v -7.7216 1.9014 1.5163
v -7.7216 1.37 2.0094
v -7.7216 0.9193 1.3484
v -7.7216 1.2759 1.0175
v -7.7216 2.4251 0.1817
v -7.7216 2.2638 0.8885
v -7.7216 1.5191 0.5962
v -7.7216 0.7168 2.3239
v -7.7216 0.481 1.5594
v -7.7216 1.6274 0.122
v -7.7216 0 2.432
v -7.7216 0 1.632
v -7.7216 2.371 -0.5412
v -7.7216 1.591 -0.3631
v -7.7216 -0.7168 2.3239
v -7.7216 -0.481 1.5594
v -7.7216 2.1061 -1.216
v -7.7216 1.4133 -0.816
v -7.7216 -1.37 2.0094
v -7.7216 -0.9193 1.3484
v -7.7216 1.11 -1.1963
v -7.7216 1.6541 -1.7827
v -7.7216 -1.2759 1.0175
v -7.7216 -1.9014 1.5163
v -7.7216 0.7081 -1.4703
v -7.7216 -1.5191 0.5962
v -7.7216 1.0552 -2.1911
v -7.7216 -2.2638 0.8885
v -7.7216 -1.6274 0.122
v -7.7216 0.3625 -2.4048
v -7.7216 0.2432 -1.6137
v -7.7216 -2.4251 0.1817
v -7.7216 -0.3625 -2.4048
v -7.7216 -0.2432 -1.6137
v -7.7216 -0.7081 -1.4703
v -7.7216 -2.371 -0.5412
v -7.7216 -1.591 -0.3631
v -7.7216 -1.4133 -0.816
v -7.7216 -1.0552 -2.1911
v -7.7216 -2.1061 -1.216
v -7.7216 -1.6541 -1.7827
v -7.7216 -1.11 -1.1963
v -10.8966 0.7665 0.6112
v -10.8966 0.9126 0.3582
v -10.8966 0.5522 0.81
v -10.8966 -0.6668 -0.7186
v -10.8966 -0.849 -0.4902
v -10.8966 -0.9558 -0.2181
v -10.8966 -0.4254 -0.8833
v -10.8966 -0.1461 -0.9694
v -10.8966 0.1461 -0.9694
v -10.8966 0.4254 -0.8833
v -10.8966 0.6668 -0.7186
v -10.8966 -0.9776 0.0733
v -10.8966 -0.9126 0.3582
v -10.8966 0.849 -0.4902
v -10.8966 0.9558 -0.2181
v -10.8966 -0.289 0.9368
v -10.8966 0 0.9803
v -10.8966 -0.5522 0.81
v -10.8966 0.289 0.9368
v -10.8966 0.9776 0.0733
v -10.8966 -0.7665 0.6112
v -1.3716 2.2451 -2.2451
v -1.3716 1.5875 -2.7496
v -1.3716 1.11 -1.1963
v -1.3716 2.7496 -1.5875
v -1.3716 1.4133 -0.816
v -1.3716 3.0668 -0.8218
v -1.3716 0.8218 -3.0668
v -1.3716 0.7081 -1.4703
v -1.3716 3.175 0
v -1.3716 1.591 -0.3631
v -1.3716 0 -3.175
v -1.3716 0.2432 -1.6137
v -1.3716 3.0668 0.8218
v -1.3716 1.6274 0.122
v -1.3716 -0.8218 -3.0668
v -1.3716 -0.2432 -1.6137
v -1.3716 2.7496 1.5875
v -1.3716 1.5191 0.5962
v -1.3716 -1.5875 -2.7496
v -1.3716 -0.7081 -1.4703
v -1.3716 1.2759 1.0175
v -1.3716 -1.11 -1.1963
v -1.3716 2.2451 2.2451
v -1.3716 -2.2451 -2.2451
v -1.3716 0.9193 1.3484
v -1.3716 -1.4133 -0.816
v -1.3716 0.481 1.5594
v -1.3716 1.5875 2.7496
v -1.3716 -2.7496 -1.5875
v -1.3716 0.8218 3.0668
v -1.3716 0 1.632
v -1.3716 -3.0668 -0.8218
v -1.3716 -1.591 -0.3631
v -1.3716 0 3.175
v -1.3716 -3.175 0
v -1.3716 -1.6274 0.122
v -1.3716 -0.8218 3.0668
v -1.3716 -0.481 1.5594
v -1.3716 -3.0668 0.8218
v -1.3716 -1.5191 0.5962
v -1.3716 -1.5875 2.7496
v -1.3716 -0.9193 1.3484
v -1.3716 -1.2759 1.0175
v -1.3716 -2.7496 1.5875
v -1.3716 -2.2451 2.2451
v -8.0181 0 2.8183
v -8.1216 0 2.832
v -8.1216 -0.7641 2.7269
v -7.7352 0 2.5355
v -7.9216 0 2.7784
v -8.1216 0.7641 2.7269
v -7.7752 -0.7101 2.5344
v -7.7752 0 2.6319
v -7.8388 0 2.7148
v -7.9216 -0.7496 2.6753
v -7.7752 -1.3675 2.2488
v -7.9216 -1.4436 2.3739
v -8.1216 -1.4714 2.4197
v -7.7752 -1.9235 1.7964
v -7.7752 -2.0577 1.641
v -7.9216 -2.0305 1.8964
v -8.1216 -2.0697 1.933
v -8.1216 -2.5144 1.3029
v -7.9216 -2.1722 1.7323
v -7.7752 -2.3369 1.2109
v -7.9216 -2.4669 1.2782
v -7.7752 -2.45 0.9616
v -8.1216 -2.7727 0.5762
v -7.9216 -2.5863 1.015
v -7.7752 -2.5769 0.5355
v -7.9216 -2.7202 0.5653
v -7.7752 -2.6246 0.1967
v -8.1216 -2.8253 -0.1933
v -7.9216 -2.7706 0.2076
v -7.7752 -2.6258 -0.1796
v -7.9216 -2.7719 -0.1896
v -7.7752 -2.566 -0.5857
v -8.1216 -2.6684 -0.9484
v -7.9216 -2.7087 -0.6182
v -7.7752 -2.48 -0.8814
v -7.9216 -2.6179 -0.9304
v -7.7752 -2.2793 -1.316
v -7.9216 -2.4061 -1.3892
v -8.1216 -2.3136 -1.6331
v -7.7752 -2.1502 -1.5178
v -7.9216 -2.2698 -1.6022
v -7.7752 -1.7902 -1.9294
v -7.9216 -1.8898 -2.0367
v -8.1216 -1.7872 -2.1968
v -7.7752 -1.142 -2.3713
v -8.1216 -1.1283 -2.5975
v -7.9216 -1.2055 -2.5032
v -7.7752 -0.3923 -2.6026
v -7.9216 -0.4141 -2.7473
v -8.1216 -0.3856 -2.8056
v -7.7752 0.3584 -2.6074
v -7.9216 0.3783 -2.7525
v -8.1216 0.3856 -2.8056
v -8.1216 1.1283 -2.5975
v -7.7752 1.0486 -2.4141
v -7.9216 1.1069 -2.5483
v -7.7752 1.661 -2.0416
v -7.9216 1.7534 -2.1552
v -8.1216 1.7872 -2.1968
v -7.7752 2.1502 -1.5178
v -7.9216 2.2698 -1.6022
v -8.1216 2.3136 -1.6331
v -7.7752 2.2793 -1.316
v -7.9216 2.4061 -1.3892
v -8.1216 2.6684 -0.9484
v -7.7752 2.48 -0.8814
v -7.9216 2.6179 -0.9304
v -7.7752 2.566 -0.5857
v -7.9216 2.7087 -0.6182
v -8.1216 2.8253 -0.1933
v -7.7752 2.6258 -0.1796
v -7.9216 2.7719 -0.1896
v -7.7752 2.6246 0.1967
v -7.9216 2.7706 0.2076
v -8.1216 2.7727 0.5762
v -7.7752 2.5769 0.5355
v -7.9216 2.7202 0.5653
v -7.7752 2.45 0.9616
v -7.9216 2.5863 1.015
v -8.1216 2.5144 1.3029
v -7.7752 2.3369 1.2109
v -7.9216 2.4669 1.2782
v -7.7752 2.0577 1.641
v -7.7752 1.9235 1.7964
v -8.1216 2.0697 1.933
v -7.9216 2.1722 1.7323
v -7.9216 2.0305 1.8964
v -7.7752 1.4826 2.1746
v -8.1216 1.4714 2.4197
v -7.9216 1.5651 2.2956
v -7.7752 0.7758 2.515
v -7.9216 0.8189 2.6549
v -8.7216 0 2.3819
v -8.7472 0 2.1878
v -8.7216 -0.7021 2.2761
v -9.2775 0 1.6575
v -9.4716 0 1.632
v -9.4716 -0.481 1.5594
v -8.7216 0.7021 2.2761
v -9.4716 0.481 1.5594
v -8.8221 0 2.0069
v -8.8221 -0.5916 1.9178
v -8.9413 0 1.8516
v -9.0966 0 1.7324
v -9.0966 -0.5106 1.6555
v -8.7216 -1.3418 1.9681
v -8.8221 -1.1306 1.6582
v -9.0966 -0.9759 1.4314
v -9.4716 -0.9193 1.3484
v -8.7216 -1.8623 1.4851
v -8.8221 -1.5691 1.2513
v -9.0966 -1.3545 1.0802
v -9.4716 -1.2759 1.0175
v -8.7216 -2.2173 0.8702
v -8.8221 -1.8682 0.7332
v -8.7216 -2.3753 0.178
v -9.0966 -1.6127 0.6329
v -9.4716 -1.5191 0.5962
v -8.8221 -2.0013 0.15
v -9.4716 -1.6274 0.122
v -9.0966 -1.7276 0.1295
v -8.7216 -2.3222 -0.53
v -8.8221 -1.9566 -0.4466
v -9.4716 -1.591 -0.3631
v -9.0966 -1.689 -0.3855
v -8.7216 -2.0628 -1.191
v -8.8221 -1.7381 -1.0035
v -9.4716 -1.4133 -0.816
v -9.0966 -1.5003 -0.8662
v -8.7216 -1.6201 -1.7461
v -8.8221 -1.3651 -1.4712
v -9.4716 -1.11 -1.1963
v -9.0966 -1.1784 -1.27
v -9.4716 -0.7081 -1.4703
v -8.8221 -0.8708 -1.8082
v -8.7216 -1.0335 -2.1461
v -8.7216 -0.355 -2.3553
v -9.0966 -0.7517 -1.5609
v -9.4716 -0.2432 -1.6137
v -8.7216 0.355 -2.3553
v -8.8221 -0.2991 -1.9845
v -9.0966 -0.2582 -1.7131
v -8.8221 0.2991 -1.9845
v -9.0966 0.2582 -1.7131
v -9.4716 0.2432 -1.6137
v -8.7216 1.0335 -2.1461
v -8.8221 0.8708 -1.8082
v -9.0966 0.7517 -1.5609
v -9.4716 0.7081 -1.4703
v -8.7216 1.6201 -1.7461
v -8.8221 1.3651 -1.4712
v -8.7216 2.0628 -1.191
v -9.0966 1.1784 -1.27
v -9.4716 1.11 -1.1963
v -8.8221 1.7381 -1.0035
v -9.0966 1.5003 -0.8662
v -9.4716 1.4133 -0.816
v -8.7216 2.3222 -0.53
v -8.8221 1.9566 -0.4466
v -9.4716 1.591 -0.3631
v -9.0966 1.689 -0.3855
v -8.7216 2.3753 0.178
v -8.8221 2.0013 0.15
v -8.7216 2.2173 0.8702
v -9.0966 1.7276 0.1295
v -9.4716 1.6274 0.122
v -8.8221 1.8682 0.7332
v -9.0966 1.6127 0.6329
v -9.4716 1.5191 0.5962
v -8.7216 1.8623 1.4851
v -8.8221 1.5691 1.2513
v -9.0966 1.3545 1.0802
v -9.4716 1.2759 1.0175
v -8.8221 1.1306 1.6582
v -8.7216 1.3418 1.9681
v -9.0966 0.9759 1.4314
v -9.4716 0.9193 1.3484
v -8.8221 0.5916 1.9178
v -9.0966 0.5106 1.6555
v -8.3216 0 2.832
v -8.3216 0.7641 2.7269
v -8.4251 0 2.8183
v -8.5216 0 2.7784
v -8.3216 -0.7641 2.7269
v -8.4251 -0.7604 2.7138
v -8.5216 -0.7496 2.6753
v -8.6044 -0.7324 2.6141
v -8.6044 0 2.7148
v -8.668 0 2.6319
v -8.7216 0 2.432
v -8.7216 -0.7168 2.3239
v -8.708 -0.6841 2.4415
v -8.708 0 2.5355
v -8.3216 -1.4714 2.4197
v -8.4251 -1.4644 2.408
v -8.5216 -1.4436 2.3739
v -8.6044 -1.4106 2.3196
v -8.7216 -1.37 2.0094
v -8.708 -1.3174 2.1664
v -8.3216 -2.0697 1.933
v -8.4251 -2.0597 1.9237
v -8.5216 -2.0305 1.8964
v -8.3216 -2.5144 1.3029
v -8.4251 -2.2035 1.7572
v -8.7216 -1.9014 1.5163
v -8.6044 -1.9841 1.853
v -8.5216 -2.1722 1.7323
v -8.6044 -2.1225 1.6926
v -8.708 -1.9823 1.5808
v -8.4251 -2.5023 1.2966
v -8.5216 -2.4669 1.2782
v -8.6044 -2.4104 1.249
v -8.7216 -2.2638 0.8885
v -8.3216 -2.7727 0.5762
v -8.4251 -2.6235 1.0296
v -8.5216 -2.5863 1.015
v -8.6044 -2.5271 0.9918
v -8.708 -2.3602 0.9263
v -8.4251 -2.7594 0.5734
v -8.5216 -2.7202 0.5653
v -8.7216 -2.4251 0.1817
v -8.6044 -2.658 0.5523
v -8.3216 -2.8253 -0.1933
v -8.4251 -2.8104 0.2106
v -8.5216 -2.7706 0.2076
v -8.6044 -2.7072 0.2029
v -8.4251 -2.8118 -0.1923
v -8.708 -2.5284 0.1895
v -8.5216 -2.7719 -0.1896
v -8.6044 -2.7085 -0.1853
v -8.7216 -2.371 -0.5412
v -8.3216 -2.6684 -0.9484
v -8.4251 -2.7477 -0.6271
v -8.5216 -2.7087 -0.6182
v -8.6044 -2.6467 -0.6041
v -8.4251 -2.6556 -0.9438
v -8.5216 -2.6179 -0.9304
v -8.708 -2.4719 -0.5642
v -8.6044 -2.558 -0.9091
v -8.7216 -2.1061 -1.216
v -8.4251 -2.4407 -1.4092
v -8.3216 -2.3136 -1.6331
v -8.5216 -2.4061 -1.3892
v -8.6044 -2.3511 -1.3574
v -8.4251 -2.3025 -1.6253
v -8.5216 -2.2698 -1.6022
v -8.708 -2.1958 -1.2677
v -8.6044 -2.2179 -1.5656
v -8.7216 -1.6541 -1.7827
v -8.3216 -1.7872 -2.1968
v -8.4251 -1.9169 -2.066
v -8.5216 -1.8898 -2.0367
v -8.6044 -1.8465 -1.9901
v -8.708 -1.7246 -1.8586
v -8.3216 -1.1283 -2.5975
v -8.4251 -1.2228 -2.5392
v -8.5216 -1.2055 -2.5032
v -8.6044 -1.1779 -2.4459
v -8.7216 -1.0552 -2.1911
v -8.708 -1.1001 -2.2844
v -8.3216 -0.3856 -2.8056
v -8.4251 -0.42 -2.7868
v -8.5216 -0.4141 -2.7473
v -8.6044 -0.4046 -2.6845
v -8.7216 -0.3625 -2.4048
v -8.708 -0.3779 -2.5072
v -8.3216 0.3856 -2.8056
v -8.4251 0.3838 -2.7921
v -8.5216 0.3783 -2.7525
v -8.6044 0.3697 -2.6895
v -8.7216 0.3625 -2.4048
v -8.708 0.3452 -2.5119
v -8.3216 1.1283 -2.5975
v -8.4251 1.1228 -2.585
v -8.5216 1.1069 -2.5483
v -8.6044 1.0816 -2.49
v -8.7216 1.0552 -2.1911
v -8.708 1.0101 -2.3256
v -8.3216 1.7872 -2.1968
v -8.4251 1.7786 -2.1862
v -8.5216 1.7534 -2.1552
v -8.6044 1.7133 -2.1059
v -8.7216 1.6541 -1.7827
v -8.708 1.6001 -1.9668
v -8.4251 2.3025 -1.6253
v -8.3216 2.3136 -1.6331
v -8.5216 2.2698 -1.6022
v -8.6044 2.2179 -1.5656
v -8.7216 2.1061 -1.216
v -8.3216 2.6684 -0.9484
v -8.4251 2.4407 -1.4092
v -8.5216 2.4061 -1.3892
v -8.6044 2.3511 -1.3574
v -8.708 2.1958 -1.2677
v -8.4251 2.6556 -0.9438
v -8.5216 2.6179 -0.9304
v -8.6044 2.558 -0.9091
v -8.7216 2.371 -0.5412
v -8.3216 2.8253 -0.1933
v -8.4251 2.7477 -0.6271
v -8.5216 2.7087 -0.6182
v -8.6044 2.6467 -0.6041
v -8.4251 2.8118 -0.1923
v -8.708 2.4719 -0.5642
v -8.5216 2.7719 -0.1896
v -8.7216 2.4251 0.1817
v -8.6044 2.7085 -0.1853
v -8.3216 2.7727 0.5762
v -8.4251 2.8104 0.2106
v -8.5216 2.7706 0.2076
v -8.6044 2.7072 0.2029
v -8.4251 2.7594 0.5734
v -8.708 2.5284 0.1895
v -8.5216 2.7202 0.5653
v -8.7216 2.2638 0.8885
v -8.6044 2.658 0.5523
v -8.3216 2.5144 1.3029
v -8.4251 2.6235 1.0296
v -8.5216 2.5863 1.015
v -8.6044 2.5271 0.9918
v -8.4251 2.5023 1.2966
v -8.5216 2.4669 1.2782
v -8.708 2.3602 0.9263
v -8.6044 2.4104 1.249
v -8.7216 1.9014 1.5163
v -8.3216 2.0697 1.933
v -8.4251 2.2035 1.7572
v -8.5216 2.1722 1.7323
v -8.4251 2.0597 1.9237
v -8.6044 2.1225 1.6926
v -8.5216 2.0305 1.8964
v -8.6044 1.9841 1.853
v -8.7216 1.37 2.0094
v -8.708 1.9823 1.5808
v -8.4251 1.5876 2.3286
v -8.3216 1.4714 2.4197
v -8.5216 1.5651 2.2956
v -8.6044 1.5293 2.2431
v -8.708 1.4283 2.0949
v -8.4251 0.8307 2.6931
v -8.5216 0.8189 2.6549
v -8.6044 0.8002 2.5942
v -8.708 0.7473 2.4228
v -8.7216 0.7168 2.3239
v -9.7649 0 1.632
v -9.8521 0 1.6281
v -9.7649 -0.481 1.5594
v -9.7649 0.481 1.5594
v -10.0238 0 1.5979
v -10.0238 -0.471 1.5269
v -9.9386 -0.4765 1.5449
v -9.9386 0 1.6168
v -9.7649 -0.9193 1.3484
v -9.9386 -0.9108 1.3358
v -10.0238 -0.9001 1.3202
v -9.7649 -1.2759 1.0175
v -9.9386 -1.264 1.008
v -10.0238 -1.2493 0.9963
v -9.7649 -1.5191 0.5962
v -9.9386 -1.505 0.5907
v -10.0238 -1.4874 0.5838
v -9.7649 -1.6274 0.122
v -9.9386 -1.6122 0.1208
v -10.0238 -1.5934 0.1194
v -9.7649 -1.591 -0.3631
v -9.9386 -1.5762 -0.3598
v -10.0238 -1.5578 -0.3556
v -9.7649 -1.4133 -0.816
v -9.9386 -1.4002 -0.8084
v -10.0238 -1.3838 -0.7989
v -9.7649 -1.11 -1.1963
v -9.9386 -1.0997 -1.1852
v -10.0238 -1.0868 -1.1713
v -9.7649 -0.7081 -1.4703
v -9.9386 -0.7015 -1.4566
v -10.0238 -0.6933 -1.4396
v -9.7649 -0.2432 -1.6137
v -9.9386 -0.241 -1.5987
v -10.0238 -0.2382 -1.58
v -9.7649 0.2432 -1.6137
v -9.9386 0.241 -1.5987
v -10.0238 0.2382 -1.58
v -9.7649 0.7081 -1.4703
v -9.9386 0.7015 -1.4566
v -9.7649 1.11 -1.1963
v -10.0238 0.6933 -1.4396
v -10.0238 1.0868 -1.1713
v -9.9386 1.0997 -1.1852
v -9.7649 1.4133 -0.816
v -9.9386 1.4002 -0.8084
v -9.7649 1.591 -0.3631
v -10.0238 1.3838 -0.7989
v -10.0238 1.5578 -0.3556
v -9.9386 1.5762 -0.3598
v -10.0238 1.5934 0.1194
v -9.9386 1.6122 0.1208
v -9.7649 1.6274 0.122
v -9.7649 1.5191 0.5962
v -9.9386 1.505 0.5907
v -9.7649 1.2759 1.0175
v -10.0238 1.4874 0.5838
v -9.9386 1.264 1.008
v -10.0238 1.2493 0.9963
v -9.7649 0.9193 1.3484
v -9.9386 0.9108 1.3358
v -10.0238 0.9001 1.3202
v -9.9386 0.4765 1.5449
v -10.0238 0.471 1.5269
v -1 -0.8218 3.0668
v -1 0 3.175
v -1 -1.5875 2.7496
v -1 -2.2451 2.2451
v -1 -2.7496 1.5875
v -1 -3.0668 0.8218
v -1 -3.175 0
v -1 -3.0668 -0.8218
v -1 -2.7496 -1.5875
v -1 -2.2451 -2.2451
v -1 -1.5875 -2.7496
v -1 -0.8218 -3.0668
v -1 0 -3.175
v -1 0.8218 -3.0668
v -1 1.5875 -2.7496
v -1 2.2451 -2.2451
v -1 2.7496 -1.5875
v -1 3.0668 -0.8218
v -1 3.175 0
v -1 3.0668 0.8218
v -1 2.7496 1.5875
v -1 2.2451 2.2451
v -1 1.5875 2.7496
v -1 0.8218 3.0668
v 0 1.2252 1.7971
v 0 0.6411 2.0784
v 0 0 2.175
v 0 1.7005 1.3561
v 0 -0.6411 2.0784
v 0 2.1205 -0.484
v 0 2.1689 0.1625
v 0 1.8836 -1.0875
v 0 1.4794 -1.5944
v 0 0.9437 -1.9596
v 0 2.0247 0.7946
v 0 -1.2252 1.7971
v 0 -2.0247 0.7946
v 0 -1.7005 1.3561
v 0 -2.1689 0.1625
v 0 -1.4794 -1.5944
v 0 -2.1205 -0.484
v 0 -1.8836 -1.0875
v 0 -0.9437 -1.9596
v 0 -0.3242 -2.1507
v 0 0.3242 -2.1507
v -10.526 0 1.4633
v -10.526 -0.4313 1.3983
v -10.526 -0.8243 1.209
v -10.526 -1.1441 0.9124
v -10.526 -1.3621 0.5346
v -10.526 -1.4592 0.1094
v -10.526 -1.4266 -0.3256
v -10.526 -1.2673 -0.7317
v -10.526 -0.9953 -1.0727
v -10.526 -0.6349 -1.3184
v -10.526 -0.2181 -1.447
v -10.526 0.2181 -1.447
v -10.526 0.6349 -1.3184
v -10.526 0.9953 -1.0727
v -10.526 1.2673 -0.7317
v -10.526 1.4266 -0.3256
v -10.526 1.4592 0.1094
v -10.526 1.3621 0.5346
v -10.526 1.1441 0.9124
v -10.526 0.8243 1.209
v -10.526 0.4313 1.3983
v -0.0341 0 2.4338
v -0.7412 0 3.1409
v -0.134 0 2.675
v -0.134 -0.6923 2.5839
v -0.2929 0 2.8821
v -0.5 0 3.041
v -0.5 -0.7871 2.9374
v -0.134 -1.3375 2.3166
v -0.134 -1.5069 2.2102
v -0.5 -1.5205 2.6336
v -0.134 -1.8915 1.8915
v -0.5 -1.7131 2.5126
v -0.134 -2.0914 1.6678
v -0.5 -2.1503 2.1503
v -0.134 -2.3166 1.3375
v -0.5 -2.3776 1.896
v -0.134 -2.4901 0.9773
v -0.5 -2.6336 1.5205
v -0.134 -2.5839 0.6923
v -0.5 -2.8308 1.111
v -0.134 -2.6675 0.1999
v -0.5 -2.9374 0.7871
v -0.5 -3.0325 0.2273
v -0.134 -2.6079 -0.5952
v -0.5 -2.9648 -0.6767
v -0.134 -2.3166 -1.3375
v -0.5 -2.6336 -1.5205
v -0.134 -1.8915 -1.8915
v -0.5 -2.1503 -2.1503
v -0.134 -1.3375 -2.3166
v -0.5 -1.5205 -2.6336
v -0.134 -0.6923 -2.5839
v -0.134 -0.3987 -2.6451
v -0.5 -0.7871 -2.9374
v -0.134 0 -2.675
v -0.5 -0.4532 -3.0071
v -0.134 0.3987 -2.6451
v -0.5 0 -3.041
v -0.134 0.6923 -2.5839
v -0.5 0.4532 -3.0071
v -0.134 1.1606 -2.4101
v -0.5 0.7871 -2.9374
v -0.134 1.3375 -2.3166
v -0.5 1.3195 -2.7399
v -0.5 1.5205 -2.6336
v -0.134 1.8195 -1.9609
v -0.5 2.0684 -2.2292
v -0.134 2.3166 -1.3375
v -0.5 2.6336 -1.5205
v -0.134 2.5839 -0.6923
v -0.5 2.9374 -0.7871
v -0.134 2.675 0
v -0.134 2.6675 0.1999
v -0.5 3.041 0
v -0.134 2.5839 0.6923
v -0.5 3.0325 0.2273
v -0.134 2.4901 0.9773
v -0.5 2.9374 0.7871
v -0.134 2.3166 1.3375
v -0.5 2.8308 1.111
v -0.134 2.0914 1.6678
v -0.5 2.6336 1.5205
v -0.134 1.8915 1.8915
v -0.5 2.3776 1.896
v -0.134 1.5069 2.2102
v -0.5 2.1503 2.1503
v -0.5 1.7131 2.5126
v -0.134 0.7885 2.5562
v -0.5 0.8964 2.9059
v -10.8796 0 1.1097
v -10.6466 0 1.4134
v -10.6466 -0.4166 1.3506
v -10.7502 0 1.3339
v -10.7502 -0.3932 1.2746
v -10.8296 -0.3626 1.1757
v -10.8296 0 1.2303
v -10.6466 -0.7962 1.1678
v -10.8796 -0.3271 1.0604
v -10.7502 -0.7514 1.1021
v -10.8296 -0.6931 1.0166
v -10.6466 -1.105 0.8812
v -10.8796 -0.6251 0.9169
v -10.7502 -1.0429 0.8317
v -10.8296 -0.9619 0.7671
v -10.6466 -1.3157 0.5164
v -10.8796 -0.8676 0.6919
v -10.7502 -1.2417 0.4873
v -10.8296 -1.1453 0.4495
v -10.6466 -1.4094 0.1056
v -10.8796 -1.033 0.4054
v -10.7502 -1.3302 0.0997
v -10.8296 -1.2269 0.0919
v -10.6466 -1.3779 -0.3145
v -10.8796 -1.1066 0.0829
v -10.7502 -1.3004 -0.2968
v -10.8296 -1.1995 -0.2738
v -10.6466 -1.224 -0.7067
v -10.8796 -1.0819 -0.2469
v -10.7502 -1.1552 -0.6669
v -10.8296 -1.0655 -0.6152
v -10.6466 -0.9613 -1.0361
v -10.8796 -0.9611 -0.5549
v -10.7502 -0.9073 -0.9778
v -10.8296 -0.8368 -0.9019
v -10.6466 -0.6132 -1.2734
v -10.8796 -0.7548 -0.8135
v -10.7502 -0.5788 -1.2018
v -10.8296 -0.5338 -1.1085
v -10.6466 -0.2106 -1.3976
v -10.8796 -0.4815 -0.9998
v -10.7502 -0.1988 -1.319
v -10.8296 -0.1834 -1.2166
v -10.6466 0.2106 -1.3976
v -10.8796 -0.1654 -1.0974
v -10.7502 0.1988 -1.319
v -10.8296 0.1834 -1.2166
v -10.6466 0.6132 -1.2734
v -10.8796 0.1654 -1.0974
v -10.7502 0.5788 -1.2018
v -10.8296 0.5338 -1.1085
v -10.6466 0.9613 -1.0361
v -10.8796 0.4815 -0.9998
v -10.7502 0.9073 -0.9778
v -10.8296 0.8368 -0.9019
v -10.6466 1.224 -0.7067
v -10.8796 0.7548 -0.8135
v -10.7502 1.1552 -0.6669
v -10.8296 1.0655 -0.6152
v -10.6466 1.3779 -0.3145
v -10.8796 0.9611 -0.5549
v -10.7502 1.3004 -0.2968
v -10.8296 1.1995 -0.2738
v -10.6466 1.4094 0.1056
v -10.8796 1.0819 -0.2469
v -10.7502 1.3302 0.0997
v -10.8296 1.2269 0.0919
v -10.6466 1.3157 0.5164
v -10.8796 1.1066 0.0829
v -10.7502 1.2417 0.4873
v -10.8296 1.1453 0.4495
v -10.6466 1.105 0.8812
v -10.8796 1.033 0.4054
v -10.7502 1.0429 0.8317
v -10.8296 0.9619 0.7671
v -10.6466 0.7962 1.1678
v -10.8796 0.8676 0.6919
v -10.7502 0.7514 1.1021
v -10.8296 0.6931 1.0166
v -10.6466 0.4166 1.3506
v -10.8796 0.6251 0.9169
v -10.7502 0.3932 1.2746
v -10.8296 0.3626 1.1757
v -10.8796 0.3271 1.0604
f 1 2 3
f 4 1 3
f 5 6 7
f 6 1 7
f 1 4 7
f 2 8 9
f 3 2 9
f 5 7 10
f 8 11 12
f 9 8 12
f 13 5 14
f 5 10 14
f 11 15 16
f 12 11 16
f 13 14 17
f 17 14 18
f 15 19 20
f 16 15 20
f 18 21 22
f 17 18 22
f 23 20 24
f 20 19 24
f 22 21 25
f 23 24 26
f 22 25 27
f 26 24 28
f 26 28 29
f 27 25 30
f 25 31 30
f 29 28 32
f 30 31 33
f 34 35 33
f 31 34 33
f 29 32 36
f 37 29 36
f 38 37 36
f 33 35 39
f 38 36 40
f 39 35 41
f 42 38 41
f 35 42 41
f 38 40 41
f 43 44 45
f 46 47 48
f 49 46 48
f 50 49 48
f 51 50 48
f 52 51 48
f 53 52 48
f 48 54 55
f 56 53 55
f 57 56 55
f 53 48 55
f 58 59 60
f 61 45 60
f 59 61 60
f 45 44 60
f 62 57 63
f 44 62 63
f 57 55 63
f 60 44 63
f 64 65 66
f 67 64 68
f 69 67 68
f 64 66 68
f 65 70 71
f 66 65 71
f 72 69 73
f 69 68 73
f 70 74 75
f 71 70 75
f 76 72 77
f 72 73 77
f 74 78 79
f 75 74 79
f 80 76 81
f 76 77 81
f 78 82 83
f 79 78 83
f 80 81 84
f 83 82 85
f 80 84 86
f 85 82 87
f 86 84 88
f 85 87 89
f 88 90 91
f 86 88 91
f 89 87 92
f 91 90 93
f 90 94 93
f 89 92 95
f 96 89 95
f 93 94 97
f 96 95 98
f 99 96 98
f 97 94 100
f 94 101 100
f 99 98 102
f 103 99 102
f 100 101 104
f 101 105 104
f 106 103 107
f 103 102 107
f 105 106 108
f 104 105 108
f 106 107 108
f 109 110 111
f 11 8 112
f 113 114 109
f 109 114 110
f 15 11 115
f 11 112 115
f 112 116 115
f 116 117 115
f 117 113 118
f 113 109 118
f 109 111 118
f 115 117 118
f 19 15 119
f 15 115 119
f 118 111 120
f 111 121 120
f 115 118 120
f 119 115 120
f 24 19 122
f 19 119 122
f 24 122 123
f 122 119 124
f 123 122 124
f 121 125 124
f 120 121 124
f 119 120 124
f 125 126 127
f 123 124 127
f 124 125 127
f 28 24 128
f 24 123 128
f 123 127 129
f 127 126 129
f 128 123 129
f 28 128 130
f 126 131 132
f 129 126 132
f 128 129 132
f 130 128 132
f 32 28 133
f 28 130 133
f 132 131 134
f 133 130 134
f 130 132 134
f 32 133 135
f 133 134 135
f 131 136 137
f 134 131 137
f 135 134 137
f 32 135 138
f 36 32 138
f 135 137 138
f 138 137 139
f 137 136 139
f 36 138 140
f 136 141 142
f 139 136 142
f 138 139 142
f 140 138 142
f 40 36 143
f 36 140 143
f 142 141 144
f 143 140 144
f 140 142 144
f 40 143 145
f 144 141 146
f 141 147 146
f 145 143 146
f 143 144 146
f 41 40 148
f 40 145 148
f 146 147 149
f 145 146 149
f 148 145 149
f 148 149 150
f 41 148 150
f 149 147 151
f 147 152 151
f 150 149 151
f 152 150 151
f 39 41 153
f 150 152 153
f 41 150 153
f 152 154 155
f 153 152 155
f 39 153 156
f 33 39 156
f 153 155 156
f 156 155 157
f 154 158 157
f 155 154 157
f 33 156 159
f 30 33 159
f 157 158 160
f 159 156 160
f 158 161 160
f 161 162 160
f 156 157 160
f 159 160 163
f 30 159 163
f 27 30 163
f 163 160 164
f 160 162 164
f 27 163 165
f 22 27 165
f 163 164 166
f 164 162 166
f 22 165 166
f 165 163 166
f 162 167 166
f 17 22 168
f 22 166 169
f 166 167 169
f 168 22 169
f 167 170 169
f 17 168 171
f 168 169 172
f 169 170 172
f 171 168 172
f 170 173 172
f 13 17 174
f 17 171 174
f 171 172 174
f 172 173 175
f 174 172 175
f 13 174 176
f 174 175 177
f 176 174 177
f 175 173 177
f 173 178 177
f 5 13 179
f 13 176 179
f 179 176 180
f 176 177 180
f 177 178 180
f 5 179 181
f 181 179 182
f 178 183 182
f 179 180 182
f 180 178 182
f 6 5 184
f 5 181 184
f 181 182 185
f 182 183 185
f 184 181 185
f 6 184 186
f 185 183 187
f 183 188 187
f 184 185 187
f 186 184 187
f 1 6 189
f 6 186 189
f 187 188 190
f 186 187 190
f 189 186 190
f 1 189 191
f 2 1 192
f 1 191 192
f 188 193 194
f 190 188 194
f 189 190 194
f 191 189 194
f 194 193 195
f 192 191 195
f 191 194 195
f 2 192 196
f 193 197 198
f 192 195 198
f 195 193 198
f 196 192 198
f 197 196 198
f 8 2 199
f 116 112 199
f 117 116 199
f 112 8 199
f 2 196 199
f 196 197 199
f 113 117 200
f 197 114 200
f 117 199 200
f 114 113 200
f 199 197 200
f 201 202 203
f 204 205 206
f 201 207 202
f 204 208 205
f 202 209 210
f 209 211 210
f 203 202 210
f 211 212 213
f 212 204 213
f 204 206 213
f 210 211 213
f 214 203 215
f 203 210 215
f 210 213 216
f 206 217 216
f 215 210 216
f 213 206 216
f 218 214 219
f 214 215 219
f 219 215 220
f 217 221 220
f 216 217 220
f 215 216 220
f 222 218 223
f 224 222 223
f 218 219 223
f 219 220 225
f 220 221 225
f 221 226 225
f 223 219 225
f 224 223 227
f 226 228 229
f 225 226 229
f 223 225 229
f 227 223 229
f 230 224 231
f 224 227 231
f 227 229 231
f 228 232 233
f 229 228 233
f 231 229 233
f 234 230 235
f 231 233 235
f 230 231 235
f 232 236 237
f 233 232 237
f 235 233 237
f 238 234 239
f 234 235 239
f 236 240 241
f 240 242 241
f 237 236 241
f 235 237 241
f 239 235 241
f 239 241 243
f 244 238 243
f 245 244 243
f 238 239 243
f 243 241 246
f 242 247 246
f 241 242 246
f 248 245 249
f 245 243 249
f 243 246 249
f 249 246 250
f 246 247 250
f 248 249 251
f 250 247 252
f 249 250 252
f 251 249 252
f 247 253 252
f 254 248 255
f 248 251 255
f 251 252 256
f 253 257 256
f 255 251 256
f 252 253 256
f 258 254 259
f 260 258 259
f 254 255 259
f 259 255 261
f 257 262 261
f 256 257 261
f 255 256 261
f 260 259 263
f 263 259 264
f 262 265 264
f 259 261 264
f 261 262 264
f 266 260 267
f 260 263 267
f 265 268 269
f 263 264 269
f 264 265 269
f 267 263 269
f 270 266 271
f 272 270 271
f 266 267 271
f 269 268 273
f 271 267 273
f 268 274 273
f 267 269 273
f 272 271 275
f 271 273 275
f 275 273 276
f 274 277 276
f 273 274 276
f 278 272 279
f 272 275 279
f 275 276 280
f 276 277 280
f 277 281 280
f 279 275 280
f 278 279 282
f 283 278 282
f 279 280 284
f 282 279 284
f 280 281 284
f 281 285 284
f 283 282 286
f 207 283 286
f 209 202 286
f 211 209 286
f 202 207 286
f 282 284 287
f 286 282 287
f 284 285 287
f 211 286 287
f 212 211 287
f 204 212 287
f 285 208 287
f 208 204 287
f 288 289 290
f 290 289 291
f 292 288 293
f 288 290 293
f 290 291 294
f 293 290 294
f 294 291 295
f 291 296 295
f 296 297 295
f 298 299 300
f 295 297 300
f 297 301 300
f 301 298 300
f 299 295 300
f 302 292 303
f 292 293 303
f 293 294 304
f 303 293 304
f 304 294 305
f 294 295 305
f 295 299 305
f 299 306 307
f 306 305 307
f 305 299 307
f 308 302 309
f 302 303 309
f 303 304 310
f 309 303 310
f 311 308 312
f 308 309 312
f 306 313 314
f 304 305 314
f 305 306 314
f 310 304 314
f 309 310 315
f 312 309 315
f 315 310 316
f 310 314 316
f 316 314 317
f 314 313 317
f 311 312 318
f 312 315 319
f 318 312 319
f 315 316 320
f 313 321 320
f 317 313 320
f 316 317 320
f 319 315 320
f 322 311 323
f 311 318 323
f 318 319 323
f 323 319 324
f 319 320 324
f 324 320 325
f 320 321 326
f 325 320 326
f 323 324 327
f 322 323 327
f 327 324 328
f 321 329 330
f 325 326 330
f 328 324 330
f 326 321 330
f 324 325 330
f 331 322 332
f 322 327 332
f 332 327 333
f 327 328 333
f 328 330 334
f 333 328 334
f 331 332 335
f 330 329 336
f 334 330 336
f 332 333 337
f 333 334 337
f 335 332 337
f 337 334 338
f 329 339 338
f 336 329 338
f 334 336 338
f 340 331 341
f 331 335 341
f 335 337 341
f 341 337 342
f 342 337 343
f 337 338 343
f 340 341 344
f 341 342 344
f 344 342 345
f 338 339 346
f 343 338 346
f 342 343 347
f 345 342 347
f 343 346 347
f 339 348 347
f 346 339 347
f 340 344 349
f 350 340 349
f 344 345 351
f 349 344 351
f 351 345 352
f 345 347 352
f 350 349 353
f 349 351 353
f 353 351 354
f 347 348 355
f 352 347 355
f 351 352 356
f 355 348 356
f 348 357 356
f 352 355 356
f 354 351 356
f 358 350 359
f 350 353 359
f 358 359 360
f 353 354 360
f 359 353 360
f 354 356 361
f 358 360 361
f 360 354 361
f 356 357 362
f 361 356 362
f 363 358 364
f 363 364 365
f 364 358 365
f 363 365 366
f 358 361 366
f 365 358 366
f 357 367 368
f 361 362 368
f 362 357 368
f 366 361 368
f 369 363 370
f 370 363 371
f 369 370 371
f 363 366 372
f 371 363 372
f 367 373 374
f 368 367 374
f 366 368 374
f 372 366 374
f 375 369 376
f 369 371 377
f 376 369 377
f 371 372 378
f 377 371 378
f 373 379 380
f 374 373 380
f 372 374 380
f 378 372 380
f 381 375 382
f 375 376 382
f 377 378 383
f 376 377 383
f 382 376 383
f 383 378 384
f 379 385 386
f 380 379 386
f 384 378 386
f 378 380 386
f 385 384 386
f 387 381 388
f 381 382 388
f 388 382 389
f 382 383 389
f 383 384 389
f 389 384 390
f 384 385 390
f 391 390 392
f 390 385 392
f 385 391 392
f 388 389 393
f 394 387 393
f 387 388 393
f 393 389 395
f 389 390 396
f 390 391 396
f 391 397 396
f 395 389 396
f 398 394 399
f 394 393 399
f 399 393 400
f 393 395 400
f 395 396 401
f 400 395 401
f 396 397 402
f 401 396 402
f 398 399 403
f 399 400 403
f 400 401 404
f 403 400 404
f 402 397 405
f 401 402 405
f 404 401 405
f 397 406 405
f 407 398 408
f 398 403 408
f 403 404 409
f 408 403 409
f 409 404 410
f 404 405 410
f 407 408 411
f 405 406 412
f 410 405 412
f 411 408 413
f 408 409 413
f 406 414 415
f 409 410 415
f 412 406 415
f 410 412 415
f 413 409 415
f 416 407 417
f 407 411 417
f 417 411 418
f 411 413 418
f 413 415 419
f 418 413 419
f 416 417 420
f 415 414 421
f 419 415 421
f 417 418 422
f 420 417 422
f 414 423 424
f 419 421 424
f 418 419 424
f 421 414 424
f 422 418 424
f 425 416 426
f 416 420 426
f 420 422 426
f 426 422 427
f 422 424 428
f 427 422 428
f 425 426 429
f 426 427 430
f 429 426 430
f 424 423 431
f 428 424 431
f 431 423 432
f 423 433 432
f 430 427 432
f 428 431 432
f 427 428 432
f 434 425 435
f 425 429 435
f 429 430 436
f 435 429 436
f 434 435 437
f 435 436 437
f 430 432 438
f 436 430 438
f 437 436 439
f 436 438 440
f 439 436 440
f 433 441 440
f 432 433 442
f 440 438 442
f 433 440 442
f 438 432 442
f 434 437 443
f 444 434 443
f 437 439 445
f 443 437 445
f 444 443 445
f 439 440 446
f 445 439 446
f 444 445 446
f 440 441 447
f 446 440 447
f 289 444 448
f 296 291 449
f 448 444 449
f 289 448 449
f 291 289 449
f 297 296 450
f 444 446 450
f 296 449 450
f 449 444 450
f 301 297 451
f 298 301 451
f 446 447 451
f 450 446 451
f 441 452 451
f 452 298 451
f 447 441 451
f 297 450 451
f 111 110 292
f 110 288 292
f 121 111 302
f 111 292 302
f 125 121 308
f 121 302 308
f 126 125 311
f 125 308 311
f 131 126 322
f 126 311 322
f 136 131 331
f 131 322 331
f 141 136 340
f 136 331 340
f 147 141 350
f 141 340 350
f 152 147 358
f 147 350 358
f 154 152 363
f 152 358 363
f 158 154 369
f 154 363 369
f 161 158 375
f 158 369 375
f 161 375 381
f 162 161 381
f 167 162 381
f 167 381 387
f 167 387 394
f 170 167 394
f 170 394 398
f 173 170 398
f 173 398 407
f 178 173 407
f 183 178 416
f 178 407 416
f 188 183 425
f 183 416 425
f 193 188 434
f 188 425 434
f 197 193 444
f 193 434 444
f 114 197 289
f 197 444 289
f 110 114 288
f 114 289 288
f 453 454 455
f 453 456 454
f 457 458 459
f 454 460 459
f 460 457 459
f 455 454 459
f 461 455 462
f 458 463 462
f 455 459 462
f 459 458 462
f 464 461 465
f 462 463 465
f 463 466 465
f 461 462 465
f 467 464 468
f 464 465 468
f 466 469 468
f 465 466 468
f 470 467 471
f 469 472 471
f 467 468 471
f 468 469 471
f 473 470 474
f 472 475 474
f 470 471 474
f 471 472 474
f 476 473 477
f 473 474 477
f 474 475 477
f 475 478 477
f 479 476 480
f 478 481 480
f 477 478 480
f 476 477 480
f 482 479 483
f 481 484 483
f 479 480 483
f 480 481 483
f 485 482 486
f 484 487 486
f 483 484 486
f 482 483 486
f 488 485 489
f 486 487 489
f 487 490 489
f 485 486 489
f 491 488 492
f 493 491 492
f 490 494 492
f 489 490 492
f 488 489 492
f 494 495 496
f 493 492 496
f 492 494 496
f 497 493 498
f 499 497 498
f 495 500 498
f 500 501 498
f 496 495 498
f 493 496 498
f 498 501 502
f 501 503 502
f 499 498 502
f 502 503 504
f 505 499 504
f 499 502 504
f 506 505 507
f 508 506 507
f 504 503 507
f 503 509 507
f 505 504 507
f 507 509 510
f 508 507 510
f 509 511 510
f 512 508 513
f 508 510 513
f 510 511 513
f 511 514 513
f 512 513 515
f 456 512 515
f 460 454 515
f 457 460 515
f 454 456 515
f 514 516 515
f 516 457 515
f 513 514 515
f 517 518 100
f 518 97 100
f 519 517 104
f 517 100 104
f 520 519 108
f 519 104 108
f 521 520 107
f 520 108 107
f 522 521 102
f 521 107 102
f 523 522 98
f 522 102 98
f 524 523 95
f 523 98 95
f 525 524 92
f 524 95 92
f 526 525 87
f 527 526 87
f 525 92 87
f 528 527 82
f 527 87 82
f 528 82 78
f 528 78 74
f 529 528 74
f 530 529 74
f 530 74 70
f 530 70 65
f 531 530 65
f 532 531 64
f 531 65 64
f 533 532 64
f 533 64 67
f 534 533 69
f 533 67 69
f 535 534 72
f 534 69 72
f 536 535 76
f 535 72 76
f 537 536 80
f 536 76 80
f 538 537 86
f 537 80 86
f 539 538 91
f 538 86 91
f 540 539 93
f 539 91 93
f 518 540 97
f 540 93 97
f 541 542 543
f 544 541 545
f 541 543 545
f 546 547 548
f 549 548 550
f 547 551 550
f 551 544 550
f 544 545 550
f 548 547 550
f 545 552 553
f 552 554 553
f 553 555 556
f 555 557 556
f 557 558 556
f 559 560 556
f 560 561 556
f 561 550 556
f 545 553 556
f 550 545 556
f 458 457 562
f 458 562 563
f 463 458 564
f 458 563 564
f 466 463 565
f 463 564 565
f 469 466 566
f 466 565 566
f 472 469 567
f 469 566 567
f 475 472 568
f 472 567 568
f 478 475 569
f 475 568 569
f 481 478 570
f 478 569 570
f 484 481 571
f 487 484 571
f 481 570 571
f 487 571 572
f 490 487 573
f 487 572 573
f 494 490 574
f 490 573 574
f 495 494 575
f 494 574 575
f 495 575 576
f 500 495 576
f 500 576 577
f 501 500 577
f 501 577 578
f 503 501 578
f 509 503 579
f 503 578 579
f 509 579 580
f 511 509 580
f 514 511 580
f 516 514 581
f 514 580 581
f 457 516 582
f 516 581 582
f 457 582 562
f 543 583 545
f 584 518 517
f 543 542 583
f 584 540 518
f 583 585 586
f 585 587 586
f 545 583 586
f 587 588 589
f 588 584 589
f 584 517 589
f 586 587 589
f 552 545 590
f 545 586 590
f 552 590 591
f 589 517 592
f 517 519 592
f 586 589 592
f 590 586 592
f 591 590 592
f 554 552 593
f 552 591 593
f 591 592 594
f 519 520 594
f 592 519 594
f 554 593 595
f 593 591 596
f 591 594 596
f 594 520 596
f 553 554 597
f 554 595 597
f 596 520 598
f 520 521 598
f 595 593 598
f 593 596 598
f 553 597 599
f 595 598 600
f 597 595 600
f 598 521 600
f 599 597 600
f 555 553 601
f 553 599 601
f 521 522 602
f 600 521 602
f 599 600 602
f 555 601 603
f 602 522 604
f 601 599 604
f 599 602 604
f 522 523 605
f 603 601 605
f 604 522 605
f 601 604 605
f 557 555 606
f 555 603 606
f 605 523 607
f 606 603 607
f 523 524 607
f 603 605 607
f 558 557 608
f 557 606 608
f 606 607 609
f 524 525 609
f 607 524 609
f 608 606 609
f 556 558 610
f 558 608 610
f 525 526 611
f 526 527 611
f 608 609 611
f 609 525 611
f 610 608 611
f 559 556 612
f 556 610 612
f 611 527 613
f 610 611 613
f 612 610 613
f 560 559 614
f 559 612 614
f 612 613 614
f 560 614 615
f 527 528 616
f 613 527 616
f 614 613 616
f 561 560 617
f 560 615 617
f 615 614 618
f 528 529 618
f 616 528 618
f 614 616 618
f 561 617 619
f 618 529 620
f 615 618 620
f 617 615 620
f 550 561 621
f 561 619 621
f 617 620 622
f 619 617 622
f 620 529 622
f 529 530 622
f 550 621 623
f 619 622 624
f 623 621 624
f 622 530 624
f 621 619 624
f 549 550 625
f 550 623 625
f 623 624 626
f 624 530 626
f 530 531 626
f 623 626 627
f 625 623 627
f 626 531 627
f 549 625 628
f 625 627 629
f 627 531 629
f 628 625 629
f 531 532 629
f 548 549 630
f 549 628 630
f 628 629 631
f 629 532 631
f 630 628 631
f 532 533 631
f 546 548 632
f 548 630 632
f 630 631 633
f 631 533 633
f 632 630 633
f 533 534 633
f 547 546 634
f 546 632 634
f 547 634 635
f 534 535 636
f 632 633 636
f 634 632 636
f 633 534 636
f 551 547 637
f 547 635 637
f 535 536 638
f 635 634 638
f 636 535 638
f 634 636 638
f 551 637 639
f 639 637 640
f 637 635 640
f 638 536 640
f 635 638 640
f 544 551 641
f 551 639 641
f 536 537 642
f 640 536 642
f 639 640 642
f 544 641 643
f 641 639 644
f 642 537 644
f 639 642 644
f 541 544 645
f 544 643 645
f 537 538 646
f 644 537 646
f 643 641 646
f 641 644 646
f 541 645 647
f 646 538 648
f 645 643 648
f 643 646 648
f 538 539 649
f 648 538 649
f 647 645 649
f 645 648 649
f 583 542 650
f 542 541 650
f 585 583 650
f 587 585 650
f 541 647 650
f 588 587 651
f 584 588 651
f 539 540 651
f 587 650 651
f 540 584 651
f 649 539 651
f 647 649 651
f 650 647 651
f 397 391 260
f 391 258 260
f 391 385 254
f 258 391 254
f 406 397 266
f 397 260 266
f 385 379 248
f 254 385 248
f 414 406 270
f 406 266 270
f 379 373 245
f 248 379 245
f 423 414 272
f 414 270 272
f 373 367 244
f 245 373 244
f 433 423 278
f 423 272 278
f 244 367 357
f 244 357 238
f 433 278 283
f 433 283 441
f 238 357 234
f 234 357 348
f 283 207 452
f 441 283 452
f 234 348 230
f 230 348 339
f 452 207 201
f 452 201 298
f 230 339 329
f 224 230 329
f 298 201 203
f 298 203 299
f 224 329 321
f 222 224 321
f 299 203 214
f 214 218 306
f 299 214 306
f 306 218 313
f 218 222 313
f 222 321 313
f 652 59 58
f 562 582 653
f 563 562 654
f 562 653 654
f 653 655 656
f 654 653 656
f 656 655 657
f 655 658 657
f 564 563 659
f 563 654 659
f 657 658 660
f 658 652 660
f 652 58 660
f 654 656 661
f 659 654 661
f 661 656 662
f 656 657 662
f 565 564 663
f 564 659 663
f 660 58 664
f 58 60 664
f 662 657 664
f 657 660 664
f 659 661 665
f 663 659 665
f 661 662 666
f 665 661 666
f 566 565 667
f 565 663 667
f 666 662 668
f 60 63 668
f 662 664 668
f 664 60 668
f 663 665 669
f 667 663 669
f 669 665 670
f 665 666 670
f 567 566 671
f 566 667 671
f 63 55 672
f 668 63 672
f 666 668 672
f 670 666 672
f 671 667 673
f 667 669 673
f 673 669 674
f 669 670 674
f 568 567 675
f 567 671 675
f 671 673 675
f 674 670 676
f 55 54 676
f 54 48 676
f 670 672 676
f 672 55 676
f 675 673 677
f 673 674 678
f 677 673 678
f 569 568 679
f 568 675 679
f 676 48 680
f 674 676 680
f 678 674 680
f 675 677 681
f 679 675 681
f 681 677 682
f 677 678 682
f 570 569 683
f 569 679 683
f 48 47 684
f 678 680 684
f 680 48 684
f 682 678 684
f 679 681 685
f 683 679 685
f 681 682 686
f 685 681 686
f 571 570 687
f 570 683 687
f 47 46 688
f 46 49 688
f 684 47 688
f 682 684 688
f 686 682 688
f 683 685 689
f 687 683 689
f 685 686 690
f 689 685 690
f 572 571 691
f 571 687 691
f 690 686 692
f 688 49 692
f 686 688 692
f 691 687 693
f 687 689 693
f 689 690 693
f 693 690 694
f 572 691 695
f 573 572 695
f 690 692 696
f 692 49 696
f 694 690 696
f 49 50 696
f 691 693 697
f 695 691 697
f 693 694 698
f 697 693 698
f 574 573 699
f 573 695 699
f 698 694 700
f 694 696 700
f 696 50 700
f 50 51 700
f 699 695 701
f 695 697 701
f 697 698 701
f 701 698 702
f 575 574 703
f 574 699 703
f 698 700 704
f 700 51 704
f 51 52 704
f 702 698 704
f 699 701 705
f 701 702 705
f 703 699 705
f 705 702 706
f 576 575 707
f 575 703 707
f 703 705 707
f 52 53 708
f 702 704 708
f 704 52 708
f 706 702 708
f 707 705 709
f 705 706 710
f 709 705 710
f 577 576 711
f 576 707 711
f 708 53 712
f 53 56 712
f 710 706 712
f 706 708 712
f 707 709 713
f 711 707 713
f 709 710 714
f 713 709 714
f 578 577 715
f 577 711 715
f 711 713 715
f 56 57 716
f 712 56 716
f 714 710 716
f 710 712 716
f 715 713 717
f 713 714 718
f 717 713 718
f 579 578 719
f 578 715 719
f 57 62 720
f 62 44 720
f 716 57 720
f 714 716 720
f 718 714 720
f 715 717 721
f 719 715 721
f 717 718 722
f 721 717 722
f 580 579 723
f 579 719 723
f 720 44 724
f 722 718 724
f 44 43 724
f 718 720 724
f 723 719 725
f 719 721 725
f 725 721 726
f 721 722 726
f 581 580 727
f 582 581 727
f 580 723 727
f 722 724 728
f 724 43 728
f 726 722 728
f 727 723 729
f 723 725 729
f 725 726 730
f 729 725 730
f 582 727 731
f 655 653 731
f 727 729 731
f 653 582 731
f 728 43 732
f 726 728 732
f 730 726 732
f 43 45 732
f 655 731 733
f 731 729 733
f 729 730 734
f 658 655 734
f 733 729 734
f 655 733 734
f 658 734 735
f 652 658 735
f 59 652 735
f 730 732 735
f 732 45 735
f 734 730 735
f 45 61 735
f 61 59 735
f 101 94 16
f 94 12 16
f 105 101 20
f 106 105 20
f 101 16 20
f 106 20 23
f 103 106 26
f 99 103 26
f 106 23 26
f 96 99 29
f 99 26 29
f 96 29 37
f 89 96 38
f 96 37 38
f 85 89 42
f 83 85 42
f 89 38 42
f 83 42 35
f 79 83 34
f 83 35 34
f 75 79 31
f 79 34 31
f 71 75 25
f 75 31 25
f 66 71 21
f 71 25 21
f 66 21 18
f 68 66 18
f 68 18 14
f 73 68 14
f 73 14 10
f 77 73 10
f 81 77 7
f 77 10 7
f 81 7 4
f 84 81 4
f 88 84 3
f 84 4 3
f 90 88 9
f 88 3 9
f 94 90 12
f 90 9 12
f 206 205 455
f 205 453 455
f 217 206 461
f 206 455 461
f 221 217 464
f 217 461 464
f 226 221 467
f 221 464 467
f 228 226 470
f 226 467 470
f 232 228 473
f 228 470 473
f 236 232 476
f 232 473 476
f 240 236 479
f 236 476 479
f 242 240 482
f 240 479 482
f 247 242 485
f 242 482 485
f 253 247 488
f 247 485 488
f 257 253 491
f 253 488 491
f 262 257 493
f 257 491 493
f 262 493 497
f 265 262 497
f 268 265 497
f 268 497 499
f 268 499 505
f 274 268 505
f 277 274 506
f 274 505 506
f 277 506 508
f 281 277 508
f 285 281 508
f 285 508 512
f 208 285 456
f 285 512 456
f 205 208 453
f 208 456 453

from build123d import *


with BuildPart() as part:
    # Sketch2 → Revolve1 (revolve)
    with BuildSketch(Plane.XY, mode=Mode.PRIVATE) as revolve1_sk:
        with BuildLine():
            Line((0, 0), (0, 2.175))
            ThreePointArc((0, 2.175), (-0.292893219, 2.882106781), (-1, 3.175))
            Line((-1, 3.175), (-1.3716, 3.175))
            Line((-1.3716, 3.175), (-1.3716, 1.63195))
            Line((-1.3716, 1.63195), (-7.7216, 1.63195))
            Line((-7.7216, 1.63195), (-7.7216, 2.43195))
            ThreePointArc((-7.7216, 2.43195), (-7.838757288, 2.714792712), (-8.1216, 2.83195))
            Line((-8.1216, 2.83195), (-8.3216, 2.83195))
            ThreePointArc((-8.3216, 2.83195), (-8.604442712, 2.714792712), (-8.7216, 2.43195))
            Line((-8.7216, 2.43195), (-8.7216, 2.38195))
            ThreePointArc((-8.7216, 2.38195), (-8.941269914, 1.851619914), (-9.4716, 1.63195))
            Line((-9.4716, 1.63195), (-9.764947502, 1.63195))
            ThreePointArc((-9.764947502, 1.63195), (-9.895473695, 1.623394861), (-10.023766548, 1.597875826))
            Line((-10.023766548, 1.597875826), (-10.526009523, 1.463300227))
            ThreePointArc((-10.526009523, 1.463300227), (-10.79327667, 1.284718028), (-10.8966, 0.980337314))
            Line((-10.8966, 0.980337314), (-10.8966, 0))
            Line((-10.8966, 0), (0, 0))
        make_face()
    revolve(revolve1_sk.sketch.rotate(Axis((-42.300017882, 0, 0), (1, 0, 0)), 90), axis=Axis((-42.300017882, 0, 0), (1, 0, 0)))


solid = part.part
